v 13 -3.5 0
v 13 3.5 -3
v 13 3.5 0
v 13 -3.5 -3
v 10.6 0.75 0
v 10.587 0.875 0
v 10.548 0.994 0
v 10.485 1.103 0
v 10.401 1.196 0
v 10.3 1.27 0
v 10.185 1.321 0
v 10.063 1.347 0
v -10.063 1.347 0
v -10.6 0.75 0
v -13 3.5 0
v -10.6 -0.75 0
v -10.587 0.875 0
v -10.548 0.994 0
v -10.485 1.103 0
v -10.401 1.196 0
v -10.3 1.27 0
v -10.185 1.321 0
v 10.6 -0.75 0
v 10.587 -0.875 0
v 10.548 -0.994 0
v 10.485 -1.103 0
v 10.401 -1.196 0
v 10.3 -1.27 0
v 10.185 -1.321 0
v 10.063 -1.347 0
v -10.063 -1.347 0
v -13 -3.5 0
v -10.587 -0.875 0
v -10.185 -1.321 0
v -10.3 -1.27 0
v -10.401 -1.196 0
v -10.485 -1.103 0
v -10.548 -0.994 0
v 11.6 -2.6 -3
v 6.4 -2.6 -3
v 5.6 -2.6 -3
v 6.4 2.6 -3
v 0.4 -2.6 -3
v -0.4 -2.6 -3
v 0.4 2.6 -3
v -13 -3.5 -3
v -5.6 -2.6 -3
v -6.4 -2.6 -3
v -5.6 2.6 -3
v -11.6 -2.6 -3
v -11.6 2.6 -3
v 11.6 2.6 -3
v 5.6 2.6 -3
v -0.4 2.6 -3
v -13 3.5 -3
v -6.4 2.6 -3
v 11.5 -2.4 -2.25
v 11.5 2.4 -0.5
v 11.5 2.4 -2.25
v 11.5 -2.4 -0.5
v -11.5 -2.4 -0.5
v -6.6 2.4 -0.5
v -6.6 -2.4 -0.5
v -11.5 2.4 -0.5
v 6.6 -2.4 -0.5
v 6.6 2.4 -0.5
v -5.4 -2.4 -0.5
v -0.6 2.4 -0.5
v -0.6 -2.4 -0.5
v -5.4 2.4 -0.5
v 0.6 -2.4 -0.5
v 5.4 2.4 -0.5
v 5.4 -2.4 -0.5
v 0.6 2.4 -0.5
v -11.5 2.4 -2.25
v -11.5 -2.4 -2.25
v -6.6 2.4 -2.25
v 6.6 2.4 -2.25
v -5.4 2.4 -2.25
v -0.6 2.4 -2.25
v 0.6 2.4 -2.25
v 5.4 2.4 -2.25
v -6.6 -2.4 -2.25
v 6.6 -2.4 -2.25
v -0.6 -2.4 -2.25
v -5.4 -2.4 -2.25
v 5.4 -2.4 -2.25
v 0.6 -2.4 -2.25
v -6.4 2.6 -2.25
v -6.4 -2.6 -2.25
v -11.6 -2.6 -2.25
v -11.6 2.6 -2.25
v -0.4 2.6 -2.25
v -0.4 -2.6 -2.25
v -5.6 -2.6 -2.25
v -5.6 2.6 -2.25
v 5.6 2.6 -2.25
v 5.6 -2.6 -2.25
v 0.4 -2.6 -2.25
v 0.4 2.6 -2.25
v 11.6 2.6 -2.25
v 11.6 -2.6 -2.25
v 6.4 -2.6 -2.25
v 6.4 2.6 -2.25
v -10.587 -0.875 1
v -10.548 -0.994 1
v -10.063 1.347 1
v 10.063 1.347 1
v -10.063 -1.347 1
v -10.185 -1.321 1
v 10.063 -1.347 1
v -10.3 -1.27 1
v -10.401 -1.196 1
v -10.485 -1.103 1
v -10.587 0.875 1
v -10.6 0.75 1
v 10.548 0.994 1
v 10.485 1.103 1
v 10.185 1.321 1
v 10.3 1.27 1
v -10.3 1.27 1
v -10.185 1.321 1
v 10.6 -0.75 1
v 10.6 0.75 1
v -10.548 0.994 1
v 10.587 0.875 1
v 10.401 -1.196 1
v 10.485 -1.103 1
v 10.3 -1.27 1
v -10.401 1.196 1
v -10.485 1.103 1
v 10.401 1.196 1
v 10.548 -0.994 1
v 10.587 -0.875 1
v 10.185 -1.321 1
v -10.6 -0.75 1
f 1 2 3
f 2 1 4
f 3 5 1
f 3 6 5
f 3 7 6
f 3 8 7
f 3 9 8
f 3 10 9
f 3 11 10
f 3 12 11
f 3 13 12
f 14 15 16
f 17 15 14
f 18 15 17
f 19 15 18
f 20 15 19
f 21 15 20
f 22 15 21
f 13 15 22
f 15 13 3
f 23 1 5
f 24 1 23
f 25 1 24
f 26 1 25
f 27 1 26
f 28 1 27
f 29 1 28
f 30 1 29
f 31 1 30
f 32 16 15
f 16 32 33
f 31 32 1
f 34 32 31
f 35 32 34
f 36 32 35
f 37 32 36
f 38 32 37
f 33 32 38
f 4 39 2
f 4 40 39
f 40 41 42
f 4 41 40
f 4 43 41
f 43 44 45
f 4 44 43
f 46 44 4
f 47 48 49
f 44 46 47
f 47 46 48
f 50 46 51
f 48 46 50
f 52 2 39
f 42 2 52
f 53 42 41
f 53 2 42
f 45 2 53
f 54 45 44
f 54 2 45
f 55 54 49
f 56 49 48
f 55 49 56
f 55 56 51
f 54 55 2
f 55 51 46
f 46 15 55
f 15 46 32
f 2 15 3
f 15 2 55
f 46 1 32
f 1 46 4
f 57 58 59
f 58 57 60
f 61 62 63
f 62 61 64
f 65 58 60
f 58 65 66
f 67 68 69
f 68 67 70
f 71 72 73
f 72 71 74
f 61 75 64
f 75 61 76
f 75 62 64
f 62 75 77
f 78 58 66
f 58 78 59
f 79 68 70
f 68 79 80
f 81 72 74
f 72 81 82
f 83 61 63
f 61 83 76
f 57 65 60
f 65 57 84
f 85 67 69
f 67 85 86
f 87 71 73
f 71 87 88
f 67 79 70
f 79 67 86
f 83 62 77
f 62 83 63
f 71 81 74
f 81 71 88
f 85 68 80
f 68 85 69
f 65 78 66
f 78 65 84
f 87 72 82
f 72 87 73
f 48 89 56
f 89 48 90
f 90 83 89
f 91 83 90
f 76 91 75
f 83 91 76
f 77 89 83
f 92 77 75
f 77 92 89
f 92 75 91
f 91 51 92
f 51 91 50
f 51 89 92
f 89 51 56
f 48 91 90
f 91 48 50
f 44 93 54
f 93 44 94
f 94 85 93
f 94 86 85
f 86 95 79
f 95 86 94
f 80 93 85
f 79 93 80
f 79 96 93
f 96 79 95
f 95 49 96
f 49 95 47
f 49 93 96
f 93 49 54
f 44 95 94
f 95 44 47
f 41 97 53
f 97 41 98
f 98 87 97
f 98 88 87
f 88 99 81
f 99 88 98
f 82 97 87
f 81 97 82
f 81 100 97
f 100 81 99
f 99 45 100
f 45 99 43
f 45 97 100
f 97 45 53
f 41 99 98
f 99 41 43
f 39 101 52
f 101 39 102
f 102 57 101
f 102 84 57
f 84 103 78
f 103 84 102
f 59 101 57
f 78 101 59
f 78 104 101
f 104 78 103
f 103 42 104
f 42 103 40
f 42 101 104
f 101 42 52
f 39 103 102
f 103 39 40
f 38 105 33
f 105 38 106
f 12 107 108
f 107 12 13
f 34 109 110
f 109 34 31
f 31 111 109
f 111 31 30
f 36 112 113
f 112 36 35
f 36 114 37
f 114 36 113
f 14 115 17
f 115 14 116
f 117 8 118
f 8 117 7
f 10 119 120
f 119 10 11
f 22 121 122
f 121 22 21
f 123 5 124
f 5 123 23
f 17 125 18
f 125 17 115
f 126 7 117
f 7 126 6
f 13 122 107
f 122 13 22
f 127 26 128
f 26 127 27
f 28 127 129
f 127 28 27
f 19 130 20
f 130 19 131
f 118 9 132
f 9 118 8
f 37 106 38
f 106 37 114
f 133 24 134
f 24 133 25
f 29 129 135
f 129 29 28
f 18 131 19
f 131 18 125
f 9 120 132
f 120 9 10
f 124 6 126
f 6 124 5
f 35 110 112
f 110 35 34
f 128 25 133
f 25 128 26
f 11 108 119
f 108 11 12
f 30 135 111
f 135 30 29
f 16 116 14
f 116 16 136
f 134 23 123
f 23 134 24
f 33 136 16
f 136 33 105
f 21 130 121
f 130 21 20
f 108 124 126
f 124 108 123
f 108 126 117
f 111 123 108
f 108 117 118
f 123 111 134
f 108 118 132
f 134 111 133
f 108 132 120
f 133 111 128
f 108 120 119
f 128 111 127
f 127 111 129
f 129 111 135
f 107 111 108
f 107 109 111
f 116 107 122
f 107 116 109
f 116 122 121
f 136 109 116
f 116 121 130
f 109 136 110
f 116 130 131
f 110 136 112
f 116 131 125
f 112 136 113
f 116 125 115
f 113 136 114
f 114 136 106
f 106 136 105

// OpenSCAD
hull(){
    translate([-10,0.75,0])cylinder(d=1.2,h=1,$fn=30);
    translate([10,0.75,0])cylinder(d=1.2,h=1,$fn=30);
    translate([-10,-0.75,0])cylinder(d=1.2,h=1,$fn=30);
    translate([10,-0.75,0])cylinder(d=1.2,h=1,$fn=30);
}

difference(){
    union(){
        difference(){
        translate([0,0,-1.5])cube([26,7,3],true);
        translate([0,0,-2])cube([23,4.8,3],true);
        }
        translate([0,0,-1.5])for(i=[-1:1:1]){
            translate([i*6,0,0])cube([1.2,5,3],true);
        }
    }
    for(i=[-1.5:1:1.5])translate([i*6,0,-3])led();
}




module reflector(wall){
    hull(){
        translate([0,1,-1.4+wall/2])hull(){
            translate([-6-wall,0,0])cylinder(d=5+wall*2,h=1,$fn=30);
            translate([6+wall,0,0])cylinder(d=5+wall*2,h=1,$fn=30);
        }
        translate([0,1,-3])cube([4.5+wall*10,4.5+wall*2,1.5],true);;
    }
    translate([0,1,-4.5+wall])cube([5.1+wall*10,5.1+wall*2,1.5],true);
}

module main(hght){
    color("lightgreen")translate([-23.4/2,-1,0])linear_extrude(hght)
        scale([0.25,0.25,0.25])import("../DXF/XLR_led.dxf");
}

module led(){
    color("white")cube([5.2,5.2,1.5],true);
}
